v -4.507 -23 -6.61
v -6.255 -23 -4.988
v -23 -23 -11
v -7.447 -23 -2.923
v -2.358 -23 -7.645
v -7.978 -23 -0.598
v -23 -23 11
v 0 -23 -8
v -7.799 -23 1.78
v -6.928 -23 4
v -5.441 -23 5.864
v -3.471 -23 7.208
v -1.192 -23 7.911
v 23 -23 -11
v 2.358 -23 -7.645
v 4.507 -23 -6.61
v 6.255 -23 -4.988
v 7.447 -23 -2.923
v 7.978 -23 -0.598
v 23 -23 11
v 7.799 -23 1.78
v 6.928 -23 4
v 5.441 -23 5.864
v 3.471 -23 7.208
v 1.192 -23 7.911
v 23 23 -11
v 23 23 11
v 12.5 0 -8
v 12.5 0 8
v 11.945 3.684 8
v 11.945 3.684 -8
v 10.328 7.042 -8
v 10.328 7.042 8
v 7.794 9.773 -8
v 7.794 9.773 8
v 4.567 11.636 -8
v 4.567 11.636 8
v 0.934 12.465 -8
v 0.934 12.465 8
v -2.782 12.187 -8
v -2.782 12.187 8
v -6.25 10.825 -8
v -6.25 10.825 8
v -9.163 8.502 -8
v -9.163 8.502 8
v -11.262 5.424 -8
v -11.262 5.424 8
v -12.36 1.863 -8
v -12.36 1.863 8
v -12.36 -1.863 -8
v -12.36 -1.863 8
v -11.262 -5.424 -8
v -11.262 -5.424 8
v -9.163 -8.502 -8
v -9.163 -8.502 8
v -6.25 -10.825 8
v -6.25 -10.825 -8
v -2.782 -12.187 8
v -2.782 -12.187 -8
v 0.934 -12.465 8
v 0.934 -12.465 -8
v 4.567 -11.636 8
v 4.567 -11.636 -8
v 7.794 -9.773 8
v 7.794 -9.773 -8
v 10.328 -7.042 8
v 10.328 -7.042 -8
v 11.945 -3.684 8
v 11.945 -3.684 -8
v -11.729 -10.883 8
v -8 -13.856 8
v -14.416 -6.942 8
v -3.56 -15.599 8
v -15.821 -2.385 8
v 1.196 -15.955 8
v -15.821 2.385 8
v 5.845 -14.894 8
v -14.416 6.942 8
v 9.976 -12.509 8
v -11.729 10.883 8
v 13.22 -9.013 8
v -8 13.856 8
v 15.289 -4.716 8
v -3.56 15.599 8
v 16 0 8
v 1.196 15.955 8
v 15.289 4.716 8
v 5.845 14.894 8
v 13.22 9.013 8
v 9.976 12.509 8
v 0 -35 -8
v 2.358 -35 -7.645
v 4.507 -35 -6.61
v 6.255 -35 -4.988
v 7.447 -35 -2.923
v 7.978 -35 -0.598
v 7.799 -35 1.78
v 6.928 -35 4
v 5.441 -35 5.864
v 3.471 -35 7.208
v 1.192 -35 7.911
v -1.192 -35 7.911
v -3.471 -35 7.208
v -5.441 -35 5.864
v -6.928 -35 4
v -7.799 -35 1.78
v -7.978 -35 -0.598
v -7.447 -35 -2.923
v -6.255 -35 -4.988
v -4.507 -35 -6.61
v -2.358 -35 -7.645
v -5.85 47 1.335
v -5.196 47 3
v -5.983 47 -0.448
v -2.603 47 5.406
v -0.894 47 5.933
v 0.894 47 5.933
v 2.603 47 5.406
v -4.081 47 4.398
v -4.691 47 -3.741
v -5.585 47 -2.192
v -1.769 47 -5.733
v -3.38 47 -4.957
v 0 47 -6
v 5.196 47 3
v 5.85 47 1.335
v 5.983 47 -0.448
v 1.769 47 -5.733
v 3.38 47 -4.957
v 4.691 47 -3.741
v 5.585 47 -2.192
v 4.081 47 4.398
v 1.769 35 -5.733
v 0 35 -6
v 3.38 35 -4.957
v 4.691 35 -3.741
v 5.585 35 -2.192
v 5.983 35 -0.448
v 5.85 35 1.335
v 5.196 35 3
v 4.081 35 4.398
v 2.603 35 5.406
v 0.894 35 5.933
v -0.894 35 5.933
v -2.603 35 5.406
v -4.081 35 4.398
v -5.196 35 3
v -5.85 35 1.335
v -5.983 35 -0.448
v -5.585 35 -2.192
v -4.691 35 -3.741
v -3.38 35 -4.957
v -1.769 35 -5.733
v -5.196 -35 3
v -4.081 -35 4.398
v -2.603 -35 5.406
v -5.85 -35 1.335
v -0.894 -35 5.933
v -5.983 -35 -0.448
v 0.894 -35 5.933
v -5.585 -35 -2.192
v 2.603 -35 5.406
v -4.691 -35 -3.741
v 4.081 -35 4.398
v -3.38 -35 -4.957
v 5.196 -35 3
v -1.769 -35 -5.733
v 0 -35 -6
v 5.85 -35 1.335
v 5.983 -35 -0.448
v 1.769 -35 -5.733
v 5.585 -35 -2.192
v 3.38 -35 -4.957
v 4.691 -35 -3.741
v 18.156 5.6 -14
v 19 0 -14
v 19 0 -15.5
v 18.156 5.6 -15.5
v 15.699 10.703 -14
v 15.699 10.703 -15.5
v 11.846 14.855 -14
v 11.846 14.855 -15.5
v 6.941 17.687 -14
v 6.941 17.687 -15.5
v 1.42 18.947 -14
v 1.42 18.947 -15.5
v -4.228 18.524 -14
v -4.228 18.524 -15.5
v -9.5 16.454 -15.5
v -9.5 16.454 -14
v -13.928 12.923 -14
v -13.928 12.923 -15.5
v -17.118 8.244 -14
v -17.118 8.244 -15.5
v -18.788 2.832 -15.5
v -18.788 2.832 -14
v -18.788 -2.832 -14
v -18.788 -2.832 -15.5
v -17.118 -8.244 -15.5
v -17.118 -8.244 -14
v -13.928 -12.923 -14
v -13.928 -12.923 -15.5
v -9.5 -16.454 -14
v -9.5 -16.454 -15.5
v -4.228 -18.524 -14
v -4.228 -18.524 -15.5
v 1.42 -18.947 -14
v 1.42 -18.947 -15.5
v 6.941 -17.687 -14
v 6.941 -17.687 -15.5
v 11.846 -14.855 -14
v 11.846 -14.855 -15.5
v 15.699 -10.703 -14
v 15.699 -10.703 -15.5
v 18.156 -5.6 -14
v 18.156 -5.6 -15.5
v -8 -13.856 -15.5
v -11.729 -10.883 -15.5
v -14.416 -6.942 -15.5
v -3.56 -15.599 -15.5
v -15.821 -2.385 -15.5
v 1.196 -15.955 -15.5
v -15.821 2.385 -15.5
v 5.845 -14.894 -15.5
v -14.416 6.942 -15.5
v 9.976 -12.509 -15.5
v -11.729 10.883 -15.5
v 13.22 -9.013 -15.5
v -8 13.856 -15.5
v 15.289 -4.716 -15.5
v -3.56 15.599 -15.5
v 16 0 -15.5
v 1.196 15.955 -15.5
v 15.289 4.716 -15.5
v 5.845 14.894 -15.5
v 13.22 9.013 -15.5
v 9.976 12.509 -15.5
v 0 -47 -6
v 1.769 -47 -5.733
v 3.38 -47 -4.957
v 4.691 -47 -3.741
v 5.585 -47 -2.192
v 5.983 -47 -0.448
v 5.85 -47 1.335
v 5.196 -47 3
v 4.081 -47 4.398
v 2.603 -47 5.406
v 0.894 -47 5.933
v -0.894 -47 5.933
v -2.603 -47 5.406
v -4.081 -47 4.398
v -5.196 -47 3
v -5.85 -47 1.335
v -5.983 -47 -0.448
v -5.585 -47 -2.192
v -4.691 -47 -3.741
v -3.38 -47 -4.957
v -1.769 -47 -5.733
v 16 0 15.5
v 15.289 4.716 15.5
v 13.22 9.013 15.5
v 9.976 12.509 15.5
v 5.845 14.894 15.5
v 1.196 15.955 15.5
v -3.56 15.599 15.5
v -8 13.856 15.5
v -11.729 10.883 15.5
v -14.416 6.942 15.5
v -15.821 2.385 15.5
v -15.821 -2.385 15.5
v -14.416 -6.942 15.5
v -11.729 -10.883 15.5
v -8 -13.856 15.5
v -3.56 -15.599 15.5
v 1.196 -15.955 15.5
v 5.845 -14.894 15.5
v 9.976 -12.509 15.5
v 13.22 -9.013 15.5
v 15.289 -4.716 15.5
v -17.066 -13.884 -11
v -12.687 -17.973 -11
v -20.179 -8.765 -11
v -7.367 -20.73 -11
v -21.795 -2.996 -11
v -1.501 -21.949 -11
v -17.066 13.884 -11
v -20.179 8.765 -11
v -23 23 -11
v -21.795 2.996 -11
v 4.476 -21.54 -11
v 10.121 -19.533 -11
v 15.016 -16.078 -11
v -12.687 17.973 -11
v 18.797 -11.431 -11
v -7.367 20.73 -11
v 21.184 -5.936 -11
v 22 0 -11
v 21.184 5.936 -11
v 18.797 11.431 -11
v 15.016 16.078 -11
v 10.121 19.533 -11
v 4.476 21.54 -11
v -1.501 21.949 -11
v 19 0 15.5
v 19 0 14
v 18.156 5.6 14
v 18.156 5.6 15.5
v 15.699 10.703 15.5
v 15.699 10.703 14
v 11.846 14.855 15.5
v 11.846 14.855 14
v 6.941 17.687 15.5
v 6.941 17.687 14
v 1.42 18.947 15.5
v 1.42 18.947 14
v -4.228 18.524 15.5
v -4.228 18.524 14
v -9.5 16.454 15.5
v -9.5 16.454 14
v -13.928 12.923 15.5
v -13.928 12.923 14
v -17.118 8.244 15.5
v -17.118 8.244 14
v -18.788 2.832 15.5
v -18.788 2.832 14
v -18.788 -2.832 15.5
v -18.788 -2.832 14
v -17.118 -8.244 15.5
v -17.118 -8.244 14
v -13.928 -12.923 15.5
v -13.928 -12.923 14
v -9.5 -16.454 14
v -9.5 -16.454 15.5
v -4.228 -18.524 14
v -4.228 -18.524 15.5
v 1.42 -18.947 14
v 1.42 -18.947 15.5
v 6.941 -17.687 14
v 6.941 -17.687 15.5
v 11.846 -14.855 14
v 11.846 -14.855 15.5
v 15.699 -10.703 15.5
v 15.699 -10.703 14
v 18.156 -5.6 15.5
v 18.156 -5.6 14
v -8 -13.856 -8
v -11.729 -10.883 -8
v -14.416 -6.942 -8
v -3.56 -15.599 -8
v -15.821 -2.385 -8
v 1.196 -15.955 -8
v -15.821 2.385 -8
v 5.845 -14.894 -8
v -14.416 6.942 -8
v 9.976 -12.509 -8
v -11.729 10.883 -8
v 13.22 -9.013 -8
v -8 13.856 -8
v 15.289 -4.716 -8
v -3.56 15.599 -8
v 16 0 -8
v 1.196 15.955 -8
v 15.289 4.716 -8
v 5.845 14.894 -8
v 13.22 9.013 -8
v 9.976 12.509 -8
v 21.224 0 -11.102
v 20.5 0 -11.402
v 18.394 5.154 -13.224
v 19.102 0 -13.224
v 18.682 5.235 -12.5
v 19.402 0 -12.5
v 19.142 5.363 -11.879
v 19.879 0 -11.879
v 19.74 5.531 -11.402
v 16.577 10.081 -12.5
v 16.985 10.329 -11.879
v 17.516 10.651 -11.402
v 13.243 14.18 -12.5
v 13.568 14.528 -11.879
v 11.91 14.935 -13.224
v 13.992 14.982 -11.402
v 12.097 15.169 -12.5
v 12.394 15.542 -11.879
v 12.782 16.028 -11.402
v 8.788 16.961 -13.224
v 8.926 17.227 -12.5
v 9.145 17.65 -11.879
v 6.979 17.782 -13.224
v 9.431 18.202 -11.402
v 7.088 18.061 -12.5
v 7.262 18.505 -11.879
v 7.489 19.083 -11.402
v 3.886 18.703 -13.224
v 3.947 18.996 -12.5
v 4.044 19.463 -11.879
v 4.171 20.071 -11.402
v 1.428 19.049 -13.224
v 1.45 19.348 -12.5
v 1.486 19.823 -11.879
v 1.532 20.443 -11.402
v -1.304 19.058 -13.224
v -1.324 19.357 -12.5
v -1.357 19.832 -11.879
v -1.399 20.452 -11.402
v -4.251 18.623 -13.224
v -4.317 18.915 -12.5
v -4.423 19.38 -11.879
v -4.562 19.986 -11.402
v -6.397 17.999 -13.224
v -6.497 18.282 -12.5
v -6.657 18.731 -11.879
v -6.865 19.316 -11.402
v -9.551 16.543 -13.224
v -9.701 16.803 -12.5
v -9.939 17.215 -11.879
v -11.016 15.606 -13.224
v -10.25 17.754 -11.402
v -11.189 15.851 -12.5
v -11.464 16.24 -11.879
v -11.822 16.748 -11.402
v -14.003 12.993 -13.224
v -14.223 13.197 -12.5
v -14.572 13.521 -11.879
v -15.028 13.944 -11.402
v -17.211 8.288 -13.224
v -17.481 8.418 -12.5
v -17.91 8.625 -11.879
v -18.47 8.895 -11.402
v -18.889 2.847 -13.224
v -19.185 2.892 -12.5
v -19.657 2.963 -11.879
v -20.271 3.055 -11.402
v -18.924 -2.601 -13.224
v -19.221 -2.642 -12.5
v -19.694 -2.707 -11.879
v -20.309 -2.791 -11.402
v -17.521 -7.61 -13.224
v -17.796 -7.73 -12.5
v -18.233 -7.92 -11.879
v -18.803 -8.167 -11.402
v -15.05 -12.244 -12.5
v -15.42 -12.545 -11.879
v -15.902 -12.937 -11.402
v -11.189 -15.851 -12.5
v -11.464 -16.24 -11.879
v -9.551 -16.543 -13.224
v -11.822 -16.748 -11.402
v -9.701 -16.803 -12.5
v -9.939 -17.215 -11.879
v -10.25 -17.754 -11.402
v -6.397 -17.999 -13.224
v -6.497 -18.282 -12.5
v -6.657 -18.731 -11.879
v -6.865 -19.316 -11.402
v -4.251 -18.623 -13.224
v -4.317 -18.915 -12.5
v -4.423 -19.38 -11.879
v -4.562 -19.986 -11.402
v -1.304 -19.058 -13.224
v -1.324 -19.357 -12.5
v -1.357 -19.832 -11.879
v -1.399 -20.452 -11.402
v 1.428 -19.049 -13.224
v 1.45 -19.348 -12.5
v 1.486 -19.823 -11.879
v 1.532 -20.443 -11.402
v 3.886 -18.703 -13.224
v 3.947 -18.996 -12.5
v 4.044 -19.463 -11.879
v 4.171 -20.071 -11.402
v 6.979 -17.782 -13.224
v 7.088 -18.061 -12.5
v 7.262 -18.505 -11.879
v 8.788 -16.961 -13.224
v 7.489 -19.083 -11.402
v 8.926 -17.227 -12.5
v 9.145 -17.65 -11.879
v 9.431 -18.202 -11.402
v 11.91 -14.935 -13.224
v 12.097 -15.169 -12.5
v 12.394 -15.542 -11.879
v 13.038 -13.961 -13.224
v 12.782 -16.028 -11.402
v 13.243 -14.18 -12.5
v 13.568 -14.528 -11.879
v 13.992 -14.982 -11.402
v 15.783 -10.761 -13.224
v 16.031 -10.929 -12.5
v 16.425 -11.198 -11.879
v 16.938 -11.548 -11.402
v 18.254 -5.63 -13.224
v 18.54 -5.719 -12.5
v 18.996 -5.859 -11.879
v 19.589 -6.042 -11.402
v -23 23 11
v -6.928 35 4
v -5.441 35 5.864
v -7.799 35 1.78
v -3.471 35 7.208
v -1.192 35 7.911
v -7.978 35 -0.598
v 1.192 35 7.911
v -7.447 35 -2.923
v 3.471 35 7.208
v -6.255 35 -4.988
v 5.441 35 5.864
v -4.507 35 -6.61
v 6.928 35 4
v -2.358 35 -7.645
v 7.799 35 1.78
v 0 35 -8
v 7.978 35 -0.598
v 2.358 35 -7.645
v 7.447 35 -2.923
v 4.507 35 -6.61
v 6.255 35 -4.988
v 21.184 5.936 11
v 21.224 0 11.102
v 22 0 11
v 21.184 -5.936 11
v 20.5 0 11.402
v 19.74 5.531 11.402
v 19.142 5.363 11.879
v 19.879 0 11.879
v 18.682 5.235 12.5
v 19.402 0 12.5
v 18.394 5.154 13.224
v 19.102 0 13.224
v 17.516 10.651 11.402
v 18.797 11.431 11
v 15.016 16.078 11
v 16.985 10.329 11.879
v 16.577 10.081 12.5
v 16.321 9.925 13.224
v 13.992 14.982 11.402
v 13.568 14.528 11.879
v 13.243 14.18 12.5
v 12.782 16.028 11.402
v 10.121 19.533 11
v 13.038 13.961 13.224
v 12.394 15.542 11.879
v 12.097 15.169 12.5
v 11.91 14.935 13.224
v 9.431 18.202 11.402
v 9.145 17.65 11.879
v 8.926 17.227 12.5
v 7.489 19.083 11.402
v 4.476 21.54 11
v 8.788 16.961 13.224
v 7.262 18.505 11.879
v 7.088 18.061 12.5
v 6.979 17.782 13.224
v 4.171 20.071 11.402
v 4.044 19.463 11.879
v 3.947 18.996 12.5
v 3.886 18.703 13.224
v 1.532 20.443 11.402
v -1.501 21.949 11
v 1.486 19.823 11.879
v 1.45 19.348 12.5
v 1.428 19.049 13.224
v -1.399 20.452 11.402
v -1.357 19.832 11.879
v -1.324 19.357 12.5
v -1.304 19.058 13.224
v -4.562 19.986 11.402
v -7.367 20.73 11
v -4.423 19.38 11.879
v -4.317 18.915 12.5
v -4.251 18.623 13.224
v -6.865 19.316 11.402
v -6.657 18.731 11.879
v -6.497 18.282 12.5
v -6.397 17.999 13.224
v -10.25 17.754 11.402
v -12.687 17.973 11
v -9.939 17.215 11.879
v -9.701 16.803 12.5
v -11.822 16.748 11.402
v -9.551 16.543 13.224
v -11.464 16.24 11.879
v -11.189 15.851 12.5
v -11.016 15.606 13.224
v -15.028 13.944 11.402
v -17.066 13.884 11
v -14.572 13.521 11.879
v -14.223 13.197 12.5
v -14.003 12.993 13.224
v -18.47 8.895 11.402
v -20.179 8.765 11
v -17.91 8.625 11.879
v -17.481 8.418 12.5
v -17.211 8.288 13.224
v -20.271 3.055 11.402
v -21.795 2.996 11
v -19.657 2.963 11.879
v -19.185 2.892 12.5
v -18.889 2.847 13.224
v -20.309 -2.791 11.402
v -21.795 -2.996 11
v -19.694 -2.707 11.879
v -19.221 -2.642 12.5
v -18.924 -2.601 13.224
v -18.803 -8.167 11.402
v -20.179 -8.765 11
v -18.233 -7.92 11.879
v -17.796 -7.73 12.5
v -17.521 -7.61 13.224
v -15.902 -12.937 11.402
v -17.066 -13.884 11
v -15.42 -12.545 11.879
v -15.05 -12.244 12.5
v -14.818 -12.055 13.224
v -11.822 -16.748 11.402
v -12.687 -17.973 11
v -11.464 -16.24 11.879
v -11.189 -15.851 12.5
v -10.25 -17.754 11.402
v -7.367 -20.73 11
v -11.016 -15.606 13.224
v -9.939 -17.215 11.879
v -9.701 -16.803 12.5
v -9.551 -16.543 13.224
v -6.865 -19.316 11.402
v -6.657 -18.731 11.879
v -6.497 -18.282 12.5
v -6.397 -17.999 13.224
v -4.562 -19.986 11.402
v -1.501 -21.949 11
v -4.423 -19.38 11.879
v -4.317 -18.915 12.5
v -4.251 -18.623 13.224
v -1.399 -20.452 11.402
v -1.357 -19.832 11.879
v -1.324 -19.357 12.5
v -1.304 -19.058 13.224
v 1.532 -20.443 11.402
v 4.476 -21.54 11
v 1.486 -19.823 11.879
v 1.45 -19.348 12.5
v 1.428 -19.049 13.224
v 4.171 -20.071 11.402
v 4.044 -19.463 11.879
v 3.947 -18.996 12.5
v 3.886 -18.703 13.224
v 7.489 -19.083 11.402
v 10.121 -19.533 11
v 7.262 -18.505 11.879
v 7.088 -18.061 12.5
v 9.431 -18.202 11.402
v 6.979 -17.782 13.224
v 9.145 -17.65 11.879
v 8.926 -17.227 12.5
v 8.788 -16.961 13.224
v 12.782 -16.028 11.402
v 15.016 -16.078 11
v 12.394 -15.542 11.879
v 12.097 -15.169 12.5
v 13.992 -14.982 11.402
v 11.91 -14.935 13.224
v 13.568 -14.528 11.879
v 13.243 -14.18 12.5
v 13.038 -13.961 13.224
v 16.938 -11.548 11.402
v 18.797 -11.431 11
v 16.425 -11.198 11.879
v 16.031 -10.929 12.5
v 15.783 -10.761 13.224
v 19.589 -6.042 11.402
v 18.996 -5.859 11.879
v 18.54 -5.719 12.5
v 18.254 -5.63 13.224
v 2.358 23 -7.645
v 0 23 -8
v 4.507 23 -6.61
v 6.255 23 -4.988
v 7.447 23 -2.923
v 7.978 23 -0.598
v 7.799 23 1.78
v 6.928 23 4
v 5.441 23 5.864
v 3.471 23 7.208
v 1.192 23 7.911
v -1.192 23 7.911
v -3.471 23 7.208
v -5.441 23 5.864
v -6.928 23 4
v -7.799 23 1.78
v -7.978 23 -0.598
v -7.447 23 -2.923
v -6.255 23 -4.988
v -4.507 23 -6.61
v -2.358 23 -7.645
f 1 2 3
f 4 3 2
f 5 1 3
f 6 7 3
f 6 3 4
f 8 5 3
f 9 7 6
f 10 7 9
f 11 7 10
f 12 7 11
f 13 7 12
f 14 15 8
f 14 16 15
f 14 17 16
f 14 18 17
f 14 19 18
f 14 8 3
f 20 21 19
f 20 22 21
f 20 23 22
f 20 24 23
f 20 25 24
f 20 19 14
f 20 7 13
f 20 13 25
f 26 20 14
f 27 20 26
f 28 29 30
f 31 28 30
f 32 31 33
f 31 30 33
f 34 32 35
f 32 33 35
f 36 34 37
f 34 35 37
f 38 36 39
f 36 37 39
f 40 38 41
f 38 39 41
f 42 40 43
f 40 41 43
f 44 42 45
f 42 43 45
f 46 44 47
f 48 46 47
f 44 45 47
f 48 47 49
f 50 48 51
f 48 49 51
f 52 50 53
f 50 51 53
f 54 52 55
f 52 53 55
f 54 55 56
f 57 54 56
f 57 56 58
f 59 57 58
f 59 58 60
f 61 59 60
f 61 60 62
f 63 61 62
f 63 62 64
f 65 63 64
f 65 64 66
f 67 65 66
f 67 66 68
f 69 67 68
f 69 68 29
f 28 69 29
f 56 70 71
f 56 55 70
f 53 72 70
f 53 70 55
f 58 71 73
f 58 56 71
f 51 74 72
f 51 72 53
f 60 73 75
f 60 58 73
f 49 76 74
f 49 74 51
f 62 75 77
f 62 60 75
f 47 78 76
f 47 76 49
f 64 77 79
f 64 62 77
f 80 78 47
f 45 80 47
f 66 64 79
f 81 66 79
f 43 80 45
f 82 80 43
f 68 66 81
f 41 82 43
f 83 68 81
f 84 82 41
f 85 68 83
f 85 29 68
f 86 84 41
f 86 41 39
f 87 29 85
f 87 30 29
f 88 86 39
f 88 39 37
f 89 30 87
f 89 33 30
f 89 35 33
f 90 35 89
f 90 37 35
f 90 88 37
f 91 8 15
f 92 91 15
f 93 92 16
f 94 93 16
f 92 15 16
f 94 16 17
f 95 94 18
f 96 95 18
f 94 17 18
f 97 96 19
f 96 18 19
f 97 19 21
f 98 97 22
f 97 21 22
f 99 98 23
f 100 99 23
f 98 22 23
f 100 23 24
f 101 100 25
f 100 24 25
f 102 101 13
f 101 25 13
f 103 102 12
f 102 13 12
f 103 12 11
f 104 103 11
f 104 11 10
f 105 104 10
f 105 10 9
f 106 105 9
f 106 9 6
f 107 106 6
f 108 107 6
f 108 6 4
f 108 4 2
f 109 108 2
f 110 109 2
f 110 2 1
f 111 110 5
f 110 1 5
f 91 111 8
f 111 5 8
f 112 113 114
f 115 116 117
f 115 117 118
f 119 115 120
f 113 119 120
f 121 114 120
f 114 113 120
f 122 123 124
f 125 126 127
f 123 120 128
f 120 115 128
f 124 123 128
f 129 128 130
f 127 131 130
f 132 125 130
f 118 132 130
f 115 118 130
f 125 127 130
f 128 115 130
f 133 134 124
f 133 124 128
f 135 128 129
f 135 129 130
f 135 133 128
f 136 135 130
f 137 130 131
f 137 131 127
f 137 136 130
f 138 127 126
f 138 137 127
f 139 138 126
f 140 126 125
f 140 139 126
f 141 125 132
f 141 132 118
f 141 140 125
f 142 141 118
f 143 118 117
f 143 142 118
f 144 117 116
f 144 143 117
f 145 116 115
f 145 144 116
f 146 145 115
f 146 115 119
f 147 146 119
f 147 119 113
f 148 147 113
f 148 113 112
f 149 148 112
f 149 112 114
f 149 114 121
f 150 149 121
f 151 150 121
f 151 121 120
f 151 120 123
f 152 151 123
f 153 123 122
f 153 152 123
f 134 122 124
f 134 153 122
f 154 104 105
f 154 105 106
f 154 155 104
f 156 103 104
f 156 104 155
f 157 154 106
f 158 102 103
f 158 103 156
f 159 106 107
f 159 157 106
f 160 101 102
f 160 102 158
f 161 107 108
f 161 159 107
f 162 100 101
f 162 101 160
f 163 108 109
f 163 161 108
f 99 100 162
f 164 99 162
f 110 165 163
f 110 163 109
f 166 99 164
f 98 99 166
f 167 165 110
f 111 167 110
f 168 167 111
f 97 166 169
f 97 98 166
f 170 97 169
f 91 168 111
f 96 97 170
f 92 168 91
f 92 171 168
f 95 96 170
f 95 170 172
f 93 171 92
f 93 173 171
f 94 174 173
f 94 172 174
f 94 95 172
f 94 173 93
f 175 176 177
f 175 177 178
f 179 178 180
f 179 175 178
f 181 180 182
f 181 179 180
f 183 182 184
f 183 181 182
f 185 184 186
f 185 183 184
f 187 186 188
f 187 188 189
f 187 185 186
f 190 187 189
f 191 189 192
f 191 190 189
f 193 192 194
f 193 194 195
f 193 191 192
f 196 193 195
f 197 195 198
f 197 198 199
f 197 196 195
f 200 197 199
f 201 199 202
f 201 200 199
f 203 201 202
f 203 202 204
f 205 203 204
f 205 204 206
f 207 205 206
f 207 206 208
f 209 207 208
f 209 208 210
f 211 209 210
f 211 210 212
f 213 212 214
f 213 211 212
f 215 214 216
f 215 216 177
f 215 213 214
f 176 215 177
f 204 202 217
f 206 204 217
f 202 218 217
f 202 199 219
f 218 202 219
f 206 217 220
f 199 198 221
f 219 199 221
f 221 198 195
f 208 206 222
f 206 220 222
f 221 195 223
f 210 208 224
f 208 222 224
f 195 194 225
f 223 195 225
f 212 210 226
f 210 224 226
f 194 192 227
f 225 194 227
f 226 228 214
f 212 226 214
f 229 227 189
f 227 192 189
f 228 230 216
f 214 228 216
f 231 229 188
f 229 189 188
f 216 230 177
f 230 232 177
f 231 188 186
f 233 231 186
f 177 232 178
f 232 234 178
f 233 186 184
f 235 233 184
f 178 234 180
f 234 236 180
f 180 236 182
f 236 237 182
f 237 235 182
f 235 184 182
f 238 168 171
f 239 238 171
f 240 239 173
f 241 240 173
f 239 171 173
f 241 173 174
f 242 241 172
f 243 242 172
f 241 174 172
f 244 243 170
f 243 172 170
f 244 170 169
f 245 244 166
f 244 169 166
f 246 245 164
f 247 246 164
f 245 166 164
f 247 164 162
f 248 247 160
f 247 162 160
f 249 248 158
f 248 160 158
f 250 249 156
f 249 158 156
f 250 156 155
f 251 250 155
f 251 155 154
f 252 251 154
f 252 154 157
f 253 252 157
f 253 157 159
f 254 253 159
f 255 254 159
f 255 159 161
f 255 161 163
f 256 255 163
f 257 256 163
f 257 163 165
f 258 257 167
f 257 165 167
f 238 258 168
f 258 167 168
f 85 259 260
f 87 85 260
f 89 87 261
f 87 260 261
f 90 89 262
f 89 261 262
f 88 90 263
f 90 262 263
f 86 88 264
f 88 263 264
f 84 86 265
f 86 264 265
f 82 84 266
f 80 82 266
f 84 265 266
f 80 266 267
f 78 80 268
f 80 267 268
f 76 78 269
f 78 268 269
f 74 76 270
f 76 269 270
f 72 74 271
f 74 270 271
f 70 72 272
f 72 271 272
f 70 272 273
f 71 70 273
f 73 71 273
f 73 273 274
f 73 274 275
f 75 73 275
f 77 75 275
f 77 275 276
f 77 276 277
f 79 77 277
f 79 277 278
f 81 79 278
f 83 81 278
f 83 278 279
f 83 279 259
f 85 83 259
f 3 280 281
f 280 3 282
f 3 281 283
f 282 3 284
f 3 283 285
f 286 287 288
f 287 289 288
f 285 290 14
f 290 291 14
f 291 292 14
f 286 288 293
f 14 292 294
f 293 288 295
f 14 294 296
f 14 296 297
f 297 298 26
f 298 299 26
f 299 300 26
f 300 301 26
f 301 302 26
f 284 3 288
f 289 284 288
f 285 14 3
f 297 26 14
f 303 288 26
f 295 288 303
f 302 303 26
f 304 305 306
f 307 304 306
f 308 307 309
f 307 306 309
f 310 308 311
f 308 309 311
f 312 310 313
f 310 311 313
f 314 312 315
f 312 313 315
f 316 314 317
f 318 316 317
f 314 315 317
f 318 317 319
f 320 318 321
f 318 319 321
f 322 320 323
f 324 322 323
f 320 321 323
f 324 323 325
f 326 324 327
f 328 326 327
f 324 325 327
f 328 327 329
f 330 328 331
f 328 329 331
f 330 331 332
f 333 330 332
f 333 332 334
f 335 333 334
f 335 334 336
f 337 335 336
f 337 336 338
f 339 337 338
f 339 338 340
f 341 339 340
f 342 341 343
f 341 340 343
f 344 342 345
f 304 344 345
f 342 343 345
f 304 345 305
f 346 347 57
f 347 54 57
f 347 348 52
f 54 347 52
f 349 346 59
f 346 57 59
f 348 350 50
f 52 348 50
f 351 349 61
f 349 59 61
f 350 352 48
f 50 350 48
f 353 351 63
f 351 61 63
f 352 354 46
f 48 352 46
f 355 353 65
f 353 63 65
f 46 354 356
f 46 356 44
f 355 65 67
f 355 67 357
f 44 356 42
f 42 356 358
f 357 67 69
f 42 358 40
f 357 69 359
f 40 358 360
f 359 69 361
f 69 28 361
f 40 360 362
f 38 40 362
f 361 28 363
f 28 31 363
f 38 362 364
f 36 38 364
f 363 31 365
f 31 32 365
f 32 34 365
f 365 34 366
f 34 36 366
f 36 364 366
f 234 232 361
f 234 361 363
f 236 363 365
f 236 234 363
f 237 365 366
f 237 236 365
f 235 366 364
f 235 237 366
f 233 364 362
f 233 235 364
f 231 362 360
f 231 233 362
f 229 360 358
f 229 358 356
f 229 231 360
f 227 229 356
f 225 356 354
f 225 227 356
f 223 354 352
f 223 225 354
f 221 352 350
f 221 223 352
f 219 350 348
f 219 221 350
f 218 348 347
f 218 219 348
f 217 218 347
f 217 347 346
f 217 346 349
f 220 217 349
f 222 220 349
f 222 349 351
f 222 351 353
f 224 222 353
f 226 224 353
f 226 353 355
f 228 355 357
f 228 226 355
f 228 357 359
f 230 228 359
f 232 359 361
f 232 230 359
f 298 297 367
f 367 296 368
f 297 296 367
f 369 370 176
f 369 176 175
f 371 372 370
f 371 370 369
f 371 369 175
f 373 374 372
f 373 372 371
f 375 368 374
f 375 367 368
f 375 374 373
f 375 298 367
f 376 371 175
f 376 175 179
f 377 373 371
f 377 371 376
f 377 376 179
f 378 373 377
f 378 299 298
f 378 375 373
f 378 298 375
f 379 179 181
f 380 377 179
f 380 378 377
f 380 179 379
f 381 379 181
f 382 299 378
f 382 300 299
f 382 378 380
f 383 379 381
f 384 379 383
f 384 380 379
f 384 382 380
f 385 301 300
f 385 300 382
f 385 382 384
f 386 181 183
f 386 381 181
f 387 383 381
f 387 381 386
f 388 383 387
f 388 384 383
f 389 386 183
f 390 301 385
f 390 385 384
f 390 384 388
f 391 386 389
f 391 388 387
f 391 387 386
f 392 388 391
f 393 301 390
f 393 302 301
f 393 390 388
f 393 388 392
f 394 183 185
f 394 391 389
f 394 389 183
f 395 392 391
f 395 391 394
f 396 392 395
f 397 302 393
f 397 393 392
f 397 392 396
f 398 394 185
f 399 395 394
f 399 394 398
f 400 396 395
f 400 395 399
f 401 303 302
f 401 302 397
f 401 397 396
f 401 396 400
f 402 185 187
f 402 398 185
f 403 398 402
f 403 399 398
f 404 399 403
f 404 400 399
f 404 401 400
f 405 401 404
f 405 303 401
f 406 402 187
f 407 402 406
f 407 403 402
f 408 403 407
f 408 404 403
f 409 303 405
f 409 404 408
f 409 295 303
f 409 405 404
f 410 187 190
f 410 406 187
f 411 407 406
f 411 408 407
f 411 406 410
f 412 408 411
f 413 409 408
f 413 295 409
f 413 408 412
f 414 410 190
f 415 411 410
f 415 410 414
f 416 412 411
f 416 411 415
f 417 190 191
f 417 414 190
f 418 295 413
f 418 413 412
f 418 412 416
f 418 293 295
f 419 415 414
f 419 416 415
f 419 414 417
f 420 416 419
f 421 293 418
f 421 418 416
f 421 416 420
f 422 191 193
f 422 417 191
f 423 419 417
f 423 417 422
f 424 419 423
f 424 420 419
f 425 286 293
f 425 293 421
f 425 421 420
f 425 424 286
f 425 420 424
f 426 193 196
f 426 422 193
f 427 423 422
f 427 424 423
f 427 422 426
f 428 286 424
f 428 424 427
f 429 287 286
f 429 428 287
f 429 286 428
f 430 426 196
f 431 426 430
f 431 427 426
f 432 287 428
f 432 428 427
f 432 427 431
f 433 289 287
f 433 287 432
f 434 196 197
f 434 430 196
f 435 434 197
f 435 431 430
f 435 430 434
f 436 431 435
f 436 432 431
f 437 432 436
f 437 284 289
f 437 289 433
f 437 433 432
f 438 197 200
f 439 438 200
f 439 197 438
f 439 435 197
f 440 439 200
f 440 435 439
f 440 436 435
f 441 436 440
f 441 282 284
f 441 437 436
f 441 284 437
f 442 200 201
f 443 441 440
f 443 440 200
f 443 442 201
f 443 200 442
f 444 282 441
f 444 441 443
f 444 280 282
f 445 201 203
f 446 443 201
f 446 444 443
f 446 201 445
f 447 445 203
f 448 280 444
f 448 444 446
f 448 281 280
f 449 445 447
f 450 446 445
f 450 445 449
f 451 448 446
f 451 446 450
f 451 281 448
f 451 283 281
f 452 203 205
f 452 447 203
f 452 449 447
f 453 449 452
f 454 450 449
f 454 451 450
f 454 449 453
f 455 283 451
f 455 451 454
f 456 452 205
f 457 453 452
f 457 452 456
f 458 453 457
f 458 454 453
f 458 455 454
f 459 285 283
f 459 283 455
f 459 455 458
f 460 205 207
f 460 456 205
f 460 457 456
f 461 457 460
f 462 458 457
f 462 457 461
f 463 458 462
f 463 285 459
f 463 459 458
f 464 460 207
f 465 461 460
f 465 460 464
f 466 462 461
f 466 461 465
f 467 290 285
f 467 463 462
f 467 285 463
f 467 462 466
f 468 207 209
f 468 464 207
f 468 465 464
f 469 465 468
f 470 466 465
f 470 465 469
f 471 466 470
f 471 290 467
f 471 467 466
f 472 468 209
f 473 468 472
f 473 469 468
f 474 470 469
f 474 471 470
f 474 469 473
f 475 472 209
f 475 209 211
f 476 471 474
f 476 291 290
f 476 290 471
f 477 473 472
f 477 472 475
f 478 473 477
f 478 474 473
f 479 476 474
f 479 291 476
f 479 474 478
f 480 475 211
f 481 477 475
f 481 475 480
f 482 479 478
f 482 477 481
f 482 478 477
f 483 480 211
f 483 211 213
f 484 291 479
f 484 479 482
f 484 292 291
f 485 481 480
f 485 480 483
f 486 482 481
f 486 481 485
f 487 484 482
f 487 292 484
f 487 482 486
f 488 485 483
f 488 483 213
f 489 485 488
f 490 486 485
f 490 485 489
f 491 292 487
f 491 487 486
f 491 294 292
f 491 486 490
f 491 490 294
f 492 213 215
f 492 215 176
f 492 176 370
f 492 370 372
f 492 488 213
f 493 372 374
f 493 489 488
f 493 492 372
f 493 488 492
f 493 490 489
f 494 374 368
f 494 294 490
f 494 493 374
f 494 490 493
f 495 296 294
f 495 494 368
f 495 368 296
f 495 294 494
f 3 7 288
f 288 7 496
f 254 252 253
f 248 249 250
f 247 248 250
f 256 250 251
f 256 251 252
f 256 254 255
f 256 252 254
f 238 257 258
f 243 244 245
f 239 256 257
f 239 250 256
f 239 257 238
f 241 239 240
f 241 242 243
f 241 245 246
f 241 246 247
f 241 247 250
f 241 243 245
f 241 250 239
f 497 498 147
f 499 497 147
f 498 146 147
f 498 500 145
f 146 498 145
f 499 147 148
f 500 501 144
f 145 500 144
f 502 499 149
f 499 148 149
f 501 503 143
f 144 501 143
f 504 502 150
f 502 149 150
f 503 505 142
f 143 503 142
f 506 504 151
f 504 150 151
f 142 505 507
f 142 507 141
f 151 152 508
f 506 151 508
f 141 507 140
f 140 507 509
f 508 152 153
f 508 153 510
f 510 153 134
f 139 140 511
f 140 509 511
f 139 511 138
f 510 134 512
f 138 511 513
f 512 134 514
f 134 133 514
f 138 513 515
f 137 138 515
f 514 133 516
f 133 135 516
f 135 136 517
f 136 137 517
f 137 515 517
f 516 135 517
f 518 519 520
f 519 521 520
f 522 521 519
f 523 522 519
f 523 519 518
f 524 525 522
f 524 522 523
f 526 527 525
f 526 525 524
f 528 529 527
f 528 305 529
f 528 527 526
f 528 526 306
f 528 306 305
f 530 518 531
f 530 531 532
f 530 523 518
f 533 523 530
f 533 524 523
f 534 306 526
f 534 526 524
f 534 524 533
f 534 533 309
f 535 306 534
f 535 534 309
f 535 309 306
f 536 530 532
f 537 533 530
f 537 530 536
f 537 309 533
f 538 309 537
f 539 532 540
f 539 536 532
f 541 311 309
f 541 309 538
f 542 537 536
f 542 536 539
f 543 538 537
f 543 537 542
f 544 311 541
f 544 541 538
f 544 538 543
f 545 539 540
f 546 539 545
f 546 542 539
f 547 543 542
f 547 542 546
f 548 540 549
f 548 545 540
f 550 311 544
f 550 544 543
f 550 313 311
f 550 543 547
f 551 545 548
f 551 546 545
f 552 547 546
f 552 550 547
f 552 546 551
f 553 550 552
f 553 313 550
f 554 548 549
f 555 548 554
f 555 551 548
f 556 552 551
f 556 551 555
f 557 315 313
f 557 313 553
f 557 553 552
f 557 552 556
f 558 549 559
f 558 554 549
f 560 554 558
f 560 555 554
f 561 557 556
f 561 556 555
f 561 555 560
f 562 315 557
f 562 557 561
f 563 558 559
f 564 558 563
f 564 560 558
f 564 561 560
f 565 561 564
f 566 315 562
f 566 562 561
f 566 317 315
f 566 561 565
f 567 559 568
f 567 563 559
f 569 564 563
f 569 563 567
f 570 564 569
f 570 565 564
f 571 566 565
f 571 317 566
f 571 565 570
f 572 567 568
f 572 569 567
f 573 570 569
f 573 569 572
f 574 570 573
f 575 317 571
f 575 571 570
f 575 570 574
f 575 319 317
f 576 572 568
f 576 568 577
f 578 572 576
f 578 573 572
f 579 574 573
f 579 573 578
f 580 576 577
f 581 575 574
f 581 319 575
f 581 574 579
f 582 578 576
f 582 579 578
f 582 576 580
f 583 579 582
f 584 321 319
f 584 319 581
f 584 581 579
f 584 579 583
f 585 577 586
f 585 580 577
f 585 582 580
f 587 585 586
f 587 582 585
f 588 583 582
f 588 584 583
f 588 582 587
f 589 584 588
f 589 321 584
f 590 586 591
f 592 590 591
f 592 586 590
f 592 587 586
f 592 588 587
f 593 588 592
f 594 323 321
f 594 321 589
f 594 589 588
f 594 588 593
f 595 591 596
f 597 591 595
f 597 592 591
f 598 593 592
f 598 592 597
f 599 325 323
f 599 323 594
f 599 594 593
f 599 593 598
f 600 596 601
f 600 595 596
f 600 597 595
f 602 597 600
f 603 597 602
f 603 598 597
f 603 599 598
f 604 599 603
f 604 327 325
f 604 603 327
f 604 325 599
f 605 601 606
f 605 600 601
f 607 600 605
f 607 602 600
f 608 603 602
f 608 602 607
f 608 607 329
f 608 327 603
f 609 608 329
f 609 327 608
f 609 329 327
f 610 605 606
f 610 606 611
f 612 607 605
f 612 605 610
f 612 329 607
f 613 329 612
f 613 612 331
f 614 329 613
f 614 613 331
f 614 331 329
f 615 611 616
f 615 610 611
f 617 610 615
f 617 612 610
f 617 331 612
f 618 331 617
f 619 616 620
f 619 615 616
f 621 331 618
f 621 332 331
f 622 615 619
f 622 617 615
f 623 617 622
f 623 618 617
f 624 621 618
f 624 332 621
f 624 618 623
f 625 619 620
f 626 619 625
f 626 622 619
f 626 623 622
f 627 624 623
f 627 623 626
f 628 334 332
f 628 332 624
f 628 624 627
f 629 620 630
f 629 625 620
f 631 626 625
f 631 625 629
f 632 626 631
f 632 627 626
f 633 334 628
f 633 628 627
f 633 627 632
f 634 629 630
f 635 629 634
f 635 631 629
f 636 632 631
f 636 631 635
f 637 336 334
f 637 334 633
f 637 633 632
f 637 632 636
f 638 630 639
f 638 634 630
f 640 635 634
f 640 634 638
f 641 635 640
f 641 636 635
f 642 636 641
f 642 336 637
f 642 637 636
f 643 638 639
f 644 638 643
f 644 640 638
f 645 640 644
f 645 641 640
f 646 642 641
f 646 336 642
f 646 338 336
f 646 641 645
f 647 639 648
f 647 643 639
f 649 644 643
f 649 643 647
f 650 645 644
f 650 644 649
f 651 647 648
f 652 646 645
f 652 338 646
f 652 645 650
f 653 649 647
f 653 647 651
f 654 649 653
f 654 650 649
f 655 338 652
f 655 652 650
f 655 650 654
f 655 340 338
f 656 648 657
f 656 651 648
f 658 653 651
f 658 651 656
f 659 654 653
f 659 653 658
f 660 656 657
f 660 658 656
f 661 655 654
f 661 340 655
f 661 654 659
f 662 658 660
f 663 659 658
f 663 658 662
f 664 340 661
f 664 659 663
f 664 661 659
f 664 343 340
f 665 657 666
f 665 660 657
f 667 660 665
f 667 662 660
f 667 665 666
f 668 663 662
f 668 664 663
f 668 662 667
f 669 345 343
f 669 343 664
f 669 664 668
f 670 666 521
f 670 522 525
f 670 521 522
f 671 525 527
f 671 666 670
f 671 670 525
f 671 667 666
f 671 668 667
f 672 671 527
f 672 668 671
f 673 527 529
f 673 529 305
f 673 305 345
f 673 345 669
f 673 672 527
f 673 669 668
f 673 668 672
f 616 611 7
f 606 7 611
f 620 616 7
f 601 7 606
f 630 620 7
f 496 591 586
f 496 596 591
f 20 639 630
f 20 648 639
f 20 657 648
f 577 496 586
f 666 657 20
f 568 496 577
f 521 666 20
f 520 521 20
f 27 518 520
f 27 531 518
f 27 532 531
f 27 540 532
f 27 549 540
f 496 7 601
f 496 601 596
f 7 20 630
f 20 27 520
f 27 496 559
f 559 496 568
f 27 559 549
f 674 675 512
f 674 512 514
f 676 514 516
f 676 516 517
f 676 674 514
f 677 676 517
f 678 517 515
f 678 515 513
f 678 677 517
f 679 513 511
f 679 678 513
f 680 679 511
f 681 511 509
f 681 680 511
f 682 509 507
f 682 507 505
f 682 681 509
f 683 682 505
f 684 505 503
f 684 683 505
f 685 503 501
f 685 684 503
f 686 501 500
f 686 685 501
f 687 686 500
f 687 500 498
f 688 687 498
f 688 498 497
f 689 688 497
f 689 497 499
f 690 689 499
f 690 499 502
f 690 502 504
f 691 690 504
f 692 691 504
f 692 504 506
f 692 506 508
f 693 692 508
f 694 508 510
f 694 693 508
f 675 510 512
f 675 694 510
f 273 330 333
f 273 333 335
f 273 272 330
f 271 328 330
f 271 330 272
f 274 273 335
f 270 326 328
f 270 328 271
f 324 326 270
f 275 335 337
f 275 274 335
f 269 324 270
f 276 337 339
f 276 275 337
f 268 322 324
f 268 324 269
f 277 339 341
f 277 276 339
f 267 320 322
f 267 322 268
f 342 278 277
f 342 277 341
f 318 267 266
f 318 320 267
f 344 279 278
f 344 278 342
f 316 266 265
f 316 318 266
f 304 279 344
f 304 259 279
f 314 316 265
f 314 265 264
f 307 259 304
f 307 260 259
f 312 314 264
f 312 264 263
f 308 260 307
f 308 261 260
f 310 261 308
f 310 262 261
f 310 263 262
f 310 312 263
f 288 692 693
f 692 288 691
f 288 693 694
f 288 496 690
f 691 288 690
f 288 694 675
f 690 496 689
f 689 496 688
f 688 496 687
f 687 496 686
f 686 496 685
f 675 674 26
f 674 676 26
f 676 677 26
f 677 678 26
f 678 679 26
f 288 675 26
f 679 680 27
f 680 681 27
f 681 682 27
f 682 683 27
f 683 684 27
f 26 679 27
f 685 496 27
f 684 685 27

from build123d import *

# Parameters (mm, degrees)
SKETCH1_W           = 46
SKETCH1_H           = 46
BOSS_EXTRUDE1_DEPTH = 11
SKETCH2_R           = 16
CUT_EXTRUDE1_DEPTH  = 3
SKETCH3_R           = 12.5
CUT_EXTRUDE2_DEPTH  = 38.669616404
SKETCH4_R           = 8
BOSS_EXTRUDE2_DEPTH = 12
SKETCH6_R           = 19
BOSS_EXTRUDE5_DEPTH = 4.5
SKETCH8_R           = 16
CUT_EXTRUDE6_DEPTH  = 7.5
FILLET1_R           = 3
SKETCH9_R           = 6
BOSS_EXTRUDE6_DEPTH = 12


with BuildPart() as part:
    # Sketch1 → Boss-Extrude1 (new, symmetric)
    with BuildSketch(Plane.XY):
        Rectangle(SKETCH1_W, SKETCH1_H)
    extrude(amount=BOSS_EXTRUDE1_DEPTH, both=True)

    # Sketch2 → Cut-Extrude1 (cut)
    with BuildSketch(Plane.XY.offset(11)):
        Circle(SKETCH2_R)
    extrude(amount=-CUT_EXTRUDE1_DEPTH, mode=Mode.SUBTRACT)

    # Sketch3 → Cut-Extrude2 (cut, through all)
    with BuildSketch(Plane.XY.offset(8)):
        Circle(SKETCH3_R)
    extrude(amount=-CUT_EXTRUDE2_DEPTH, mode=Mode.SUBTRACT)

    # Sketch4 → Boss-Extrude2 (add)
    with BuildSketch(Plane.XZ.offset(23)):
        with Locations(Location((0, 0, 0), (0, 0, 270))):
            Circle(SKETCH4_R)
    boss_extrude2 = extrude(amount=BOSS_EXTRUDE2_DEPTH)

    # Sketch6 → Boss-Extrude5 (add)
    with BuildSketch(Plane.XY.offset(11)):
        Circle(SKETCH6_R)
    boss_extrude5 = extrude(amount=BOSS_EXTRUDE5_DEPTH)

    # Sketch8 → Cut-Extrude6 (cut)
    with BuildSketch(Plane.XY.offset(15.5)):
        Circle(SKETCH8_R)
    cut_extrude6 = extrude(amount=-CUT_EXTRUDE6_DEPTH, mode=Mode.SUBTRACT)

    # Mirror2: Boss-Extrude5 across plane
    add(boss_extrude5.mirror(Plane.XY))

    # Mirror3: Cut-Extrude6 across plane
    add(cut_extrude6.mirror(Plane.XY), mode=Mode.SUBTRACT)

    # Fillet1
    fillet1_edges = [part.edges().sort_by_distance(p)[0] for p in [
        (-19, 0, 11),
        (-19, 0, -11),
    ]]
    fillet(fillet1_edges, radius=FILLET1_R)

    # Sketch9 → Boss-Extrude6 (add)
    with BuildSketch(Plane.XZ.offset(35)):
        with Locations(Location((0, 0, 0), (0, 0, 270))):
            Circle(SKETCH9_R)
    boss_extrude6 = extrude(amount=BOSS_EXTRUDE6_DEPTH)

    # Mirror4: Boss-Extrude2, Boss-Extrude6 across plane
    add(boss_extrude2.mirror(Plane.ZX))
    add(boss_extrude6.mirror(Plane.ZX))


solid = part.part
